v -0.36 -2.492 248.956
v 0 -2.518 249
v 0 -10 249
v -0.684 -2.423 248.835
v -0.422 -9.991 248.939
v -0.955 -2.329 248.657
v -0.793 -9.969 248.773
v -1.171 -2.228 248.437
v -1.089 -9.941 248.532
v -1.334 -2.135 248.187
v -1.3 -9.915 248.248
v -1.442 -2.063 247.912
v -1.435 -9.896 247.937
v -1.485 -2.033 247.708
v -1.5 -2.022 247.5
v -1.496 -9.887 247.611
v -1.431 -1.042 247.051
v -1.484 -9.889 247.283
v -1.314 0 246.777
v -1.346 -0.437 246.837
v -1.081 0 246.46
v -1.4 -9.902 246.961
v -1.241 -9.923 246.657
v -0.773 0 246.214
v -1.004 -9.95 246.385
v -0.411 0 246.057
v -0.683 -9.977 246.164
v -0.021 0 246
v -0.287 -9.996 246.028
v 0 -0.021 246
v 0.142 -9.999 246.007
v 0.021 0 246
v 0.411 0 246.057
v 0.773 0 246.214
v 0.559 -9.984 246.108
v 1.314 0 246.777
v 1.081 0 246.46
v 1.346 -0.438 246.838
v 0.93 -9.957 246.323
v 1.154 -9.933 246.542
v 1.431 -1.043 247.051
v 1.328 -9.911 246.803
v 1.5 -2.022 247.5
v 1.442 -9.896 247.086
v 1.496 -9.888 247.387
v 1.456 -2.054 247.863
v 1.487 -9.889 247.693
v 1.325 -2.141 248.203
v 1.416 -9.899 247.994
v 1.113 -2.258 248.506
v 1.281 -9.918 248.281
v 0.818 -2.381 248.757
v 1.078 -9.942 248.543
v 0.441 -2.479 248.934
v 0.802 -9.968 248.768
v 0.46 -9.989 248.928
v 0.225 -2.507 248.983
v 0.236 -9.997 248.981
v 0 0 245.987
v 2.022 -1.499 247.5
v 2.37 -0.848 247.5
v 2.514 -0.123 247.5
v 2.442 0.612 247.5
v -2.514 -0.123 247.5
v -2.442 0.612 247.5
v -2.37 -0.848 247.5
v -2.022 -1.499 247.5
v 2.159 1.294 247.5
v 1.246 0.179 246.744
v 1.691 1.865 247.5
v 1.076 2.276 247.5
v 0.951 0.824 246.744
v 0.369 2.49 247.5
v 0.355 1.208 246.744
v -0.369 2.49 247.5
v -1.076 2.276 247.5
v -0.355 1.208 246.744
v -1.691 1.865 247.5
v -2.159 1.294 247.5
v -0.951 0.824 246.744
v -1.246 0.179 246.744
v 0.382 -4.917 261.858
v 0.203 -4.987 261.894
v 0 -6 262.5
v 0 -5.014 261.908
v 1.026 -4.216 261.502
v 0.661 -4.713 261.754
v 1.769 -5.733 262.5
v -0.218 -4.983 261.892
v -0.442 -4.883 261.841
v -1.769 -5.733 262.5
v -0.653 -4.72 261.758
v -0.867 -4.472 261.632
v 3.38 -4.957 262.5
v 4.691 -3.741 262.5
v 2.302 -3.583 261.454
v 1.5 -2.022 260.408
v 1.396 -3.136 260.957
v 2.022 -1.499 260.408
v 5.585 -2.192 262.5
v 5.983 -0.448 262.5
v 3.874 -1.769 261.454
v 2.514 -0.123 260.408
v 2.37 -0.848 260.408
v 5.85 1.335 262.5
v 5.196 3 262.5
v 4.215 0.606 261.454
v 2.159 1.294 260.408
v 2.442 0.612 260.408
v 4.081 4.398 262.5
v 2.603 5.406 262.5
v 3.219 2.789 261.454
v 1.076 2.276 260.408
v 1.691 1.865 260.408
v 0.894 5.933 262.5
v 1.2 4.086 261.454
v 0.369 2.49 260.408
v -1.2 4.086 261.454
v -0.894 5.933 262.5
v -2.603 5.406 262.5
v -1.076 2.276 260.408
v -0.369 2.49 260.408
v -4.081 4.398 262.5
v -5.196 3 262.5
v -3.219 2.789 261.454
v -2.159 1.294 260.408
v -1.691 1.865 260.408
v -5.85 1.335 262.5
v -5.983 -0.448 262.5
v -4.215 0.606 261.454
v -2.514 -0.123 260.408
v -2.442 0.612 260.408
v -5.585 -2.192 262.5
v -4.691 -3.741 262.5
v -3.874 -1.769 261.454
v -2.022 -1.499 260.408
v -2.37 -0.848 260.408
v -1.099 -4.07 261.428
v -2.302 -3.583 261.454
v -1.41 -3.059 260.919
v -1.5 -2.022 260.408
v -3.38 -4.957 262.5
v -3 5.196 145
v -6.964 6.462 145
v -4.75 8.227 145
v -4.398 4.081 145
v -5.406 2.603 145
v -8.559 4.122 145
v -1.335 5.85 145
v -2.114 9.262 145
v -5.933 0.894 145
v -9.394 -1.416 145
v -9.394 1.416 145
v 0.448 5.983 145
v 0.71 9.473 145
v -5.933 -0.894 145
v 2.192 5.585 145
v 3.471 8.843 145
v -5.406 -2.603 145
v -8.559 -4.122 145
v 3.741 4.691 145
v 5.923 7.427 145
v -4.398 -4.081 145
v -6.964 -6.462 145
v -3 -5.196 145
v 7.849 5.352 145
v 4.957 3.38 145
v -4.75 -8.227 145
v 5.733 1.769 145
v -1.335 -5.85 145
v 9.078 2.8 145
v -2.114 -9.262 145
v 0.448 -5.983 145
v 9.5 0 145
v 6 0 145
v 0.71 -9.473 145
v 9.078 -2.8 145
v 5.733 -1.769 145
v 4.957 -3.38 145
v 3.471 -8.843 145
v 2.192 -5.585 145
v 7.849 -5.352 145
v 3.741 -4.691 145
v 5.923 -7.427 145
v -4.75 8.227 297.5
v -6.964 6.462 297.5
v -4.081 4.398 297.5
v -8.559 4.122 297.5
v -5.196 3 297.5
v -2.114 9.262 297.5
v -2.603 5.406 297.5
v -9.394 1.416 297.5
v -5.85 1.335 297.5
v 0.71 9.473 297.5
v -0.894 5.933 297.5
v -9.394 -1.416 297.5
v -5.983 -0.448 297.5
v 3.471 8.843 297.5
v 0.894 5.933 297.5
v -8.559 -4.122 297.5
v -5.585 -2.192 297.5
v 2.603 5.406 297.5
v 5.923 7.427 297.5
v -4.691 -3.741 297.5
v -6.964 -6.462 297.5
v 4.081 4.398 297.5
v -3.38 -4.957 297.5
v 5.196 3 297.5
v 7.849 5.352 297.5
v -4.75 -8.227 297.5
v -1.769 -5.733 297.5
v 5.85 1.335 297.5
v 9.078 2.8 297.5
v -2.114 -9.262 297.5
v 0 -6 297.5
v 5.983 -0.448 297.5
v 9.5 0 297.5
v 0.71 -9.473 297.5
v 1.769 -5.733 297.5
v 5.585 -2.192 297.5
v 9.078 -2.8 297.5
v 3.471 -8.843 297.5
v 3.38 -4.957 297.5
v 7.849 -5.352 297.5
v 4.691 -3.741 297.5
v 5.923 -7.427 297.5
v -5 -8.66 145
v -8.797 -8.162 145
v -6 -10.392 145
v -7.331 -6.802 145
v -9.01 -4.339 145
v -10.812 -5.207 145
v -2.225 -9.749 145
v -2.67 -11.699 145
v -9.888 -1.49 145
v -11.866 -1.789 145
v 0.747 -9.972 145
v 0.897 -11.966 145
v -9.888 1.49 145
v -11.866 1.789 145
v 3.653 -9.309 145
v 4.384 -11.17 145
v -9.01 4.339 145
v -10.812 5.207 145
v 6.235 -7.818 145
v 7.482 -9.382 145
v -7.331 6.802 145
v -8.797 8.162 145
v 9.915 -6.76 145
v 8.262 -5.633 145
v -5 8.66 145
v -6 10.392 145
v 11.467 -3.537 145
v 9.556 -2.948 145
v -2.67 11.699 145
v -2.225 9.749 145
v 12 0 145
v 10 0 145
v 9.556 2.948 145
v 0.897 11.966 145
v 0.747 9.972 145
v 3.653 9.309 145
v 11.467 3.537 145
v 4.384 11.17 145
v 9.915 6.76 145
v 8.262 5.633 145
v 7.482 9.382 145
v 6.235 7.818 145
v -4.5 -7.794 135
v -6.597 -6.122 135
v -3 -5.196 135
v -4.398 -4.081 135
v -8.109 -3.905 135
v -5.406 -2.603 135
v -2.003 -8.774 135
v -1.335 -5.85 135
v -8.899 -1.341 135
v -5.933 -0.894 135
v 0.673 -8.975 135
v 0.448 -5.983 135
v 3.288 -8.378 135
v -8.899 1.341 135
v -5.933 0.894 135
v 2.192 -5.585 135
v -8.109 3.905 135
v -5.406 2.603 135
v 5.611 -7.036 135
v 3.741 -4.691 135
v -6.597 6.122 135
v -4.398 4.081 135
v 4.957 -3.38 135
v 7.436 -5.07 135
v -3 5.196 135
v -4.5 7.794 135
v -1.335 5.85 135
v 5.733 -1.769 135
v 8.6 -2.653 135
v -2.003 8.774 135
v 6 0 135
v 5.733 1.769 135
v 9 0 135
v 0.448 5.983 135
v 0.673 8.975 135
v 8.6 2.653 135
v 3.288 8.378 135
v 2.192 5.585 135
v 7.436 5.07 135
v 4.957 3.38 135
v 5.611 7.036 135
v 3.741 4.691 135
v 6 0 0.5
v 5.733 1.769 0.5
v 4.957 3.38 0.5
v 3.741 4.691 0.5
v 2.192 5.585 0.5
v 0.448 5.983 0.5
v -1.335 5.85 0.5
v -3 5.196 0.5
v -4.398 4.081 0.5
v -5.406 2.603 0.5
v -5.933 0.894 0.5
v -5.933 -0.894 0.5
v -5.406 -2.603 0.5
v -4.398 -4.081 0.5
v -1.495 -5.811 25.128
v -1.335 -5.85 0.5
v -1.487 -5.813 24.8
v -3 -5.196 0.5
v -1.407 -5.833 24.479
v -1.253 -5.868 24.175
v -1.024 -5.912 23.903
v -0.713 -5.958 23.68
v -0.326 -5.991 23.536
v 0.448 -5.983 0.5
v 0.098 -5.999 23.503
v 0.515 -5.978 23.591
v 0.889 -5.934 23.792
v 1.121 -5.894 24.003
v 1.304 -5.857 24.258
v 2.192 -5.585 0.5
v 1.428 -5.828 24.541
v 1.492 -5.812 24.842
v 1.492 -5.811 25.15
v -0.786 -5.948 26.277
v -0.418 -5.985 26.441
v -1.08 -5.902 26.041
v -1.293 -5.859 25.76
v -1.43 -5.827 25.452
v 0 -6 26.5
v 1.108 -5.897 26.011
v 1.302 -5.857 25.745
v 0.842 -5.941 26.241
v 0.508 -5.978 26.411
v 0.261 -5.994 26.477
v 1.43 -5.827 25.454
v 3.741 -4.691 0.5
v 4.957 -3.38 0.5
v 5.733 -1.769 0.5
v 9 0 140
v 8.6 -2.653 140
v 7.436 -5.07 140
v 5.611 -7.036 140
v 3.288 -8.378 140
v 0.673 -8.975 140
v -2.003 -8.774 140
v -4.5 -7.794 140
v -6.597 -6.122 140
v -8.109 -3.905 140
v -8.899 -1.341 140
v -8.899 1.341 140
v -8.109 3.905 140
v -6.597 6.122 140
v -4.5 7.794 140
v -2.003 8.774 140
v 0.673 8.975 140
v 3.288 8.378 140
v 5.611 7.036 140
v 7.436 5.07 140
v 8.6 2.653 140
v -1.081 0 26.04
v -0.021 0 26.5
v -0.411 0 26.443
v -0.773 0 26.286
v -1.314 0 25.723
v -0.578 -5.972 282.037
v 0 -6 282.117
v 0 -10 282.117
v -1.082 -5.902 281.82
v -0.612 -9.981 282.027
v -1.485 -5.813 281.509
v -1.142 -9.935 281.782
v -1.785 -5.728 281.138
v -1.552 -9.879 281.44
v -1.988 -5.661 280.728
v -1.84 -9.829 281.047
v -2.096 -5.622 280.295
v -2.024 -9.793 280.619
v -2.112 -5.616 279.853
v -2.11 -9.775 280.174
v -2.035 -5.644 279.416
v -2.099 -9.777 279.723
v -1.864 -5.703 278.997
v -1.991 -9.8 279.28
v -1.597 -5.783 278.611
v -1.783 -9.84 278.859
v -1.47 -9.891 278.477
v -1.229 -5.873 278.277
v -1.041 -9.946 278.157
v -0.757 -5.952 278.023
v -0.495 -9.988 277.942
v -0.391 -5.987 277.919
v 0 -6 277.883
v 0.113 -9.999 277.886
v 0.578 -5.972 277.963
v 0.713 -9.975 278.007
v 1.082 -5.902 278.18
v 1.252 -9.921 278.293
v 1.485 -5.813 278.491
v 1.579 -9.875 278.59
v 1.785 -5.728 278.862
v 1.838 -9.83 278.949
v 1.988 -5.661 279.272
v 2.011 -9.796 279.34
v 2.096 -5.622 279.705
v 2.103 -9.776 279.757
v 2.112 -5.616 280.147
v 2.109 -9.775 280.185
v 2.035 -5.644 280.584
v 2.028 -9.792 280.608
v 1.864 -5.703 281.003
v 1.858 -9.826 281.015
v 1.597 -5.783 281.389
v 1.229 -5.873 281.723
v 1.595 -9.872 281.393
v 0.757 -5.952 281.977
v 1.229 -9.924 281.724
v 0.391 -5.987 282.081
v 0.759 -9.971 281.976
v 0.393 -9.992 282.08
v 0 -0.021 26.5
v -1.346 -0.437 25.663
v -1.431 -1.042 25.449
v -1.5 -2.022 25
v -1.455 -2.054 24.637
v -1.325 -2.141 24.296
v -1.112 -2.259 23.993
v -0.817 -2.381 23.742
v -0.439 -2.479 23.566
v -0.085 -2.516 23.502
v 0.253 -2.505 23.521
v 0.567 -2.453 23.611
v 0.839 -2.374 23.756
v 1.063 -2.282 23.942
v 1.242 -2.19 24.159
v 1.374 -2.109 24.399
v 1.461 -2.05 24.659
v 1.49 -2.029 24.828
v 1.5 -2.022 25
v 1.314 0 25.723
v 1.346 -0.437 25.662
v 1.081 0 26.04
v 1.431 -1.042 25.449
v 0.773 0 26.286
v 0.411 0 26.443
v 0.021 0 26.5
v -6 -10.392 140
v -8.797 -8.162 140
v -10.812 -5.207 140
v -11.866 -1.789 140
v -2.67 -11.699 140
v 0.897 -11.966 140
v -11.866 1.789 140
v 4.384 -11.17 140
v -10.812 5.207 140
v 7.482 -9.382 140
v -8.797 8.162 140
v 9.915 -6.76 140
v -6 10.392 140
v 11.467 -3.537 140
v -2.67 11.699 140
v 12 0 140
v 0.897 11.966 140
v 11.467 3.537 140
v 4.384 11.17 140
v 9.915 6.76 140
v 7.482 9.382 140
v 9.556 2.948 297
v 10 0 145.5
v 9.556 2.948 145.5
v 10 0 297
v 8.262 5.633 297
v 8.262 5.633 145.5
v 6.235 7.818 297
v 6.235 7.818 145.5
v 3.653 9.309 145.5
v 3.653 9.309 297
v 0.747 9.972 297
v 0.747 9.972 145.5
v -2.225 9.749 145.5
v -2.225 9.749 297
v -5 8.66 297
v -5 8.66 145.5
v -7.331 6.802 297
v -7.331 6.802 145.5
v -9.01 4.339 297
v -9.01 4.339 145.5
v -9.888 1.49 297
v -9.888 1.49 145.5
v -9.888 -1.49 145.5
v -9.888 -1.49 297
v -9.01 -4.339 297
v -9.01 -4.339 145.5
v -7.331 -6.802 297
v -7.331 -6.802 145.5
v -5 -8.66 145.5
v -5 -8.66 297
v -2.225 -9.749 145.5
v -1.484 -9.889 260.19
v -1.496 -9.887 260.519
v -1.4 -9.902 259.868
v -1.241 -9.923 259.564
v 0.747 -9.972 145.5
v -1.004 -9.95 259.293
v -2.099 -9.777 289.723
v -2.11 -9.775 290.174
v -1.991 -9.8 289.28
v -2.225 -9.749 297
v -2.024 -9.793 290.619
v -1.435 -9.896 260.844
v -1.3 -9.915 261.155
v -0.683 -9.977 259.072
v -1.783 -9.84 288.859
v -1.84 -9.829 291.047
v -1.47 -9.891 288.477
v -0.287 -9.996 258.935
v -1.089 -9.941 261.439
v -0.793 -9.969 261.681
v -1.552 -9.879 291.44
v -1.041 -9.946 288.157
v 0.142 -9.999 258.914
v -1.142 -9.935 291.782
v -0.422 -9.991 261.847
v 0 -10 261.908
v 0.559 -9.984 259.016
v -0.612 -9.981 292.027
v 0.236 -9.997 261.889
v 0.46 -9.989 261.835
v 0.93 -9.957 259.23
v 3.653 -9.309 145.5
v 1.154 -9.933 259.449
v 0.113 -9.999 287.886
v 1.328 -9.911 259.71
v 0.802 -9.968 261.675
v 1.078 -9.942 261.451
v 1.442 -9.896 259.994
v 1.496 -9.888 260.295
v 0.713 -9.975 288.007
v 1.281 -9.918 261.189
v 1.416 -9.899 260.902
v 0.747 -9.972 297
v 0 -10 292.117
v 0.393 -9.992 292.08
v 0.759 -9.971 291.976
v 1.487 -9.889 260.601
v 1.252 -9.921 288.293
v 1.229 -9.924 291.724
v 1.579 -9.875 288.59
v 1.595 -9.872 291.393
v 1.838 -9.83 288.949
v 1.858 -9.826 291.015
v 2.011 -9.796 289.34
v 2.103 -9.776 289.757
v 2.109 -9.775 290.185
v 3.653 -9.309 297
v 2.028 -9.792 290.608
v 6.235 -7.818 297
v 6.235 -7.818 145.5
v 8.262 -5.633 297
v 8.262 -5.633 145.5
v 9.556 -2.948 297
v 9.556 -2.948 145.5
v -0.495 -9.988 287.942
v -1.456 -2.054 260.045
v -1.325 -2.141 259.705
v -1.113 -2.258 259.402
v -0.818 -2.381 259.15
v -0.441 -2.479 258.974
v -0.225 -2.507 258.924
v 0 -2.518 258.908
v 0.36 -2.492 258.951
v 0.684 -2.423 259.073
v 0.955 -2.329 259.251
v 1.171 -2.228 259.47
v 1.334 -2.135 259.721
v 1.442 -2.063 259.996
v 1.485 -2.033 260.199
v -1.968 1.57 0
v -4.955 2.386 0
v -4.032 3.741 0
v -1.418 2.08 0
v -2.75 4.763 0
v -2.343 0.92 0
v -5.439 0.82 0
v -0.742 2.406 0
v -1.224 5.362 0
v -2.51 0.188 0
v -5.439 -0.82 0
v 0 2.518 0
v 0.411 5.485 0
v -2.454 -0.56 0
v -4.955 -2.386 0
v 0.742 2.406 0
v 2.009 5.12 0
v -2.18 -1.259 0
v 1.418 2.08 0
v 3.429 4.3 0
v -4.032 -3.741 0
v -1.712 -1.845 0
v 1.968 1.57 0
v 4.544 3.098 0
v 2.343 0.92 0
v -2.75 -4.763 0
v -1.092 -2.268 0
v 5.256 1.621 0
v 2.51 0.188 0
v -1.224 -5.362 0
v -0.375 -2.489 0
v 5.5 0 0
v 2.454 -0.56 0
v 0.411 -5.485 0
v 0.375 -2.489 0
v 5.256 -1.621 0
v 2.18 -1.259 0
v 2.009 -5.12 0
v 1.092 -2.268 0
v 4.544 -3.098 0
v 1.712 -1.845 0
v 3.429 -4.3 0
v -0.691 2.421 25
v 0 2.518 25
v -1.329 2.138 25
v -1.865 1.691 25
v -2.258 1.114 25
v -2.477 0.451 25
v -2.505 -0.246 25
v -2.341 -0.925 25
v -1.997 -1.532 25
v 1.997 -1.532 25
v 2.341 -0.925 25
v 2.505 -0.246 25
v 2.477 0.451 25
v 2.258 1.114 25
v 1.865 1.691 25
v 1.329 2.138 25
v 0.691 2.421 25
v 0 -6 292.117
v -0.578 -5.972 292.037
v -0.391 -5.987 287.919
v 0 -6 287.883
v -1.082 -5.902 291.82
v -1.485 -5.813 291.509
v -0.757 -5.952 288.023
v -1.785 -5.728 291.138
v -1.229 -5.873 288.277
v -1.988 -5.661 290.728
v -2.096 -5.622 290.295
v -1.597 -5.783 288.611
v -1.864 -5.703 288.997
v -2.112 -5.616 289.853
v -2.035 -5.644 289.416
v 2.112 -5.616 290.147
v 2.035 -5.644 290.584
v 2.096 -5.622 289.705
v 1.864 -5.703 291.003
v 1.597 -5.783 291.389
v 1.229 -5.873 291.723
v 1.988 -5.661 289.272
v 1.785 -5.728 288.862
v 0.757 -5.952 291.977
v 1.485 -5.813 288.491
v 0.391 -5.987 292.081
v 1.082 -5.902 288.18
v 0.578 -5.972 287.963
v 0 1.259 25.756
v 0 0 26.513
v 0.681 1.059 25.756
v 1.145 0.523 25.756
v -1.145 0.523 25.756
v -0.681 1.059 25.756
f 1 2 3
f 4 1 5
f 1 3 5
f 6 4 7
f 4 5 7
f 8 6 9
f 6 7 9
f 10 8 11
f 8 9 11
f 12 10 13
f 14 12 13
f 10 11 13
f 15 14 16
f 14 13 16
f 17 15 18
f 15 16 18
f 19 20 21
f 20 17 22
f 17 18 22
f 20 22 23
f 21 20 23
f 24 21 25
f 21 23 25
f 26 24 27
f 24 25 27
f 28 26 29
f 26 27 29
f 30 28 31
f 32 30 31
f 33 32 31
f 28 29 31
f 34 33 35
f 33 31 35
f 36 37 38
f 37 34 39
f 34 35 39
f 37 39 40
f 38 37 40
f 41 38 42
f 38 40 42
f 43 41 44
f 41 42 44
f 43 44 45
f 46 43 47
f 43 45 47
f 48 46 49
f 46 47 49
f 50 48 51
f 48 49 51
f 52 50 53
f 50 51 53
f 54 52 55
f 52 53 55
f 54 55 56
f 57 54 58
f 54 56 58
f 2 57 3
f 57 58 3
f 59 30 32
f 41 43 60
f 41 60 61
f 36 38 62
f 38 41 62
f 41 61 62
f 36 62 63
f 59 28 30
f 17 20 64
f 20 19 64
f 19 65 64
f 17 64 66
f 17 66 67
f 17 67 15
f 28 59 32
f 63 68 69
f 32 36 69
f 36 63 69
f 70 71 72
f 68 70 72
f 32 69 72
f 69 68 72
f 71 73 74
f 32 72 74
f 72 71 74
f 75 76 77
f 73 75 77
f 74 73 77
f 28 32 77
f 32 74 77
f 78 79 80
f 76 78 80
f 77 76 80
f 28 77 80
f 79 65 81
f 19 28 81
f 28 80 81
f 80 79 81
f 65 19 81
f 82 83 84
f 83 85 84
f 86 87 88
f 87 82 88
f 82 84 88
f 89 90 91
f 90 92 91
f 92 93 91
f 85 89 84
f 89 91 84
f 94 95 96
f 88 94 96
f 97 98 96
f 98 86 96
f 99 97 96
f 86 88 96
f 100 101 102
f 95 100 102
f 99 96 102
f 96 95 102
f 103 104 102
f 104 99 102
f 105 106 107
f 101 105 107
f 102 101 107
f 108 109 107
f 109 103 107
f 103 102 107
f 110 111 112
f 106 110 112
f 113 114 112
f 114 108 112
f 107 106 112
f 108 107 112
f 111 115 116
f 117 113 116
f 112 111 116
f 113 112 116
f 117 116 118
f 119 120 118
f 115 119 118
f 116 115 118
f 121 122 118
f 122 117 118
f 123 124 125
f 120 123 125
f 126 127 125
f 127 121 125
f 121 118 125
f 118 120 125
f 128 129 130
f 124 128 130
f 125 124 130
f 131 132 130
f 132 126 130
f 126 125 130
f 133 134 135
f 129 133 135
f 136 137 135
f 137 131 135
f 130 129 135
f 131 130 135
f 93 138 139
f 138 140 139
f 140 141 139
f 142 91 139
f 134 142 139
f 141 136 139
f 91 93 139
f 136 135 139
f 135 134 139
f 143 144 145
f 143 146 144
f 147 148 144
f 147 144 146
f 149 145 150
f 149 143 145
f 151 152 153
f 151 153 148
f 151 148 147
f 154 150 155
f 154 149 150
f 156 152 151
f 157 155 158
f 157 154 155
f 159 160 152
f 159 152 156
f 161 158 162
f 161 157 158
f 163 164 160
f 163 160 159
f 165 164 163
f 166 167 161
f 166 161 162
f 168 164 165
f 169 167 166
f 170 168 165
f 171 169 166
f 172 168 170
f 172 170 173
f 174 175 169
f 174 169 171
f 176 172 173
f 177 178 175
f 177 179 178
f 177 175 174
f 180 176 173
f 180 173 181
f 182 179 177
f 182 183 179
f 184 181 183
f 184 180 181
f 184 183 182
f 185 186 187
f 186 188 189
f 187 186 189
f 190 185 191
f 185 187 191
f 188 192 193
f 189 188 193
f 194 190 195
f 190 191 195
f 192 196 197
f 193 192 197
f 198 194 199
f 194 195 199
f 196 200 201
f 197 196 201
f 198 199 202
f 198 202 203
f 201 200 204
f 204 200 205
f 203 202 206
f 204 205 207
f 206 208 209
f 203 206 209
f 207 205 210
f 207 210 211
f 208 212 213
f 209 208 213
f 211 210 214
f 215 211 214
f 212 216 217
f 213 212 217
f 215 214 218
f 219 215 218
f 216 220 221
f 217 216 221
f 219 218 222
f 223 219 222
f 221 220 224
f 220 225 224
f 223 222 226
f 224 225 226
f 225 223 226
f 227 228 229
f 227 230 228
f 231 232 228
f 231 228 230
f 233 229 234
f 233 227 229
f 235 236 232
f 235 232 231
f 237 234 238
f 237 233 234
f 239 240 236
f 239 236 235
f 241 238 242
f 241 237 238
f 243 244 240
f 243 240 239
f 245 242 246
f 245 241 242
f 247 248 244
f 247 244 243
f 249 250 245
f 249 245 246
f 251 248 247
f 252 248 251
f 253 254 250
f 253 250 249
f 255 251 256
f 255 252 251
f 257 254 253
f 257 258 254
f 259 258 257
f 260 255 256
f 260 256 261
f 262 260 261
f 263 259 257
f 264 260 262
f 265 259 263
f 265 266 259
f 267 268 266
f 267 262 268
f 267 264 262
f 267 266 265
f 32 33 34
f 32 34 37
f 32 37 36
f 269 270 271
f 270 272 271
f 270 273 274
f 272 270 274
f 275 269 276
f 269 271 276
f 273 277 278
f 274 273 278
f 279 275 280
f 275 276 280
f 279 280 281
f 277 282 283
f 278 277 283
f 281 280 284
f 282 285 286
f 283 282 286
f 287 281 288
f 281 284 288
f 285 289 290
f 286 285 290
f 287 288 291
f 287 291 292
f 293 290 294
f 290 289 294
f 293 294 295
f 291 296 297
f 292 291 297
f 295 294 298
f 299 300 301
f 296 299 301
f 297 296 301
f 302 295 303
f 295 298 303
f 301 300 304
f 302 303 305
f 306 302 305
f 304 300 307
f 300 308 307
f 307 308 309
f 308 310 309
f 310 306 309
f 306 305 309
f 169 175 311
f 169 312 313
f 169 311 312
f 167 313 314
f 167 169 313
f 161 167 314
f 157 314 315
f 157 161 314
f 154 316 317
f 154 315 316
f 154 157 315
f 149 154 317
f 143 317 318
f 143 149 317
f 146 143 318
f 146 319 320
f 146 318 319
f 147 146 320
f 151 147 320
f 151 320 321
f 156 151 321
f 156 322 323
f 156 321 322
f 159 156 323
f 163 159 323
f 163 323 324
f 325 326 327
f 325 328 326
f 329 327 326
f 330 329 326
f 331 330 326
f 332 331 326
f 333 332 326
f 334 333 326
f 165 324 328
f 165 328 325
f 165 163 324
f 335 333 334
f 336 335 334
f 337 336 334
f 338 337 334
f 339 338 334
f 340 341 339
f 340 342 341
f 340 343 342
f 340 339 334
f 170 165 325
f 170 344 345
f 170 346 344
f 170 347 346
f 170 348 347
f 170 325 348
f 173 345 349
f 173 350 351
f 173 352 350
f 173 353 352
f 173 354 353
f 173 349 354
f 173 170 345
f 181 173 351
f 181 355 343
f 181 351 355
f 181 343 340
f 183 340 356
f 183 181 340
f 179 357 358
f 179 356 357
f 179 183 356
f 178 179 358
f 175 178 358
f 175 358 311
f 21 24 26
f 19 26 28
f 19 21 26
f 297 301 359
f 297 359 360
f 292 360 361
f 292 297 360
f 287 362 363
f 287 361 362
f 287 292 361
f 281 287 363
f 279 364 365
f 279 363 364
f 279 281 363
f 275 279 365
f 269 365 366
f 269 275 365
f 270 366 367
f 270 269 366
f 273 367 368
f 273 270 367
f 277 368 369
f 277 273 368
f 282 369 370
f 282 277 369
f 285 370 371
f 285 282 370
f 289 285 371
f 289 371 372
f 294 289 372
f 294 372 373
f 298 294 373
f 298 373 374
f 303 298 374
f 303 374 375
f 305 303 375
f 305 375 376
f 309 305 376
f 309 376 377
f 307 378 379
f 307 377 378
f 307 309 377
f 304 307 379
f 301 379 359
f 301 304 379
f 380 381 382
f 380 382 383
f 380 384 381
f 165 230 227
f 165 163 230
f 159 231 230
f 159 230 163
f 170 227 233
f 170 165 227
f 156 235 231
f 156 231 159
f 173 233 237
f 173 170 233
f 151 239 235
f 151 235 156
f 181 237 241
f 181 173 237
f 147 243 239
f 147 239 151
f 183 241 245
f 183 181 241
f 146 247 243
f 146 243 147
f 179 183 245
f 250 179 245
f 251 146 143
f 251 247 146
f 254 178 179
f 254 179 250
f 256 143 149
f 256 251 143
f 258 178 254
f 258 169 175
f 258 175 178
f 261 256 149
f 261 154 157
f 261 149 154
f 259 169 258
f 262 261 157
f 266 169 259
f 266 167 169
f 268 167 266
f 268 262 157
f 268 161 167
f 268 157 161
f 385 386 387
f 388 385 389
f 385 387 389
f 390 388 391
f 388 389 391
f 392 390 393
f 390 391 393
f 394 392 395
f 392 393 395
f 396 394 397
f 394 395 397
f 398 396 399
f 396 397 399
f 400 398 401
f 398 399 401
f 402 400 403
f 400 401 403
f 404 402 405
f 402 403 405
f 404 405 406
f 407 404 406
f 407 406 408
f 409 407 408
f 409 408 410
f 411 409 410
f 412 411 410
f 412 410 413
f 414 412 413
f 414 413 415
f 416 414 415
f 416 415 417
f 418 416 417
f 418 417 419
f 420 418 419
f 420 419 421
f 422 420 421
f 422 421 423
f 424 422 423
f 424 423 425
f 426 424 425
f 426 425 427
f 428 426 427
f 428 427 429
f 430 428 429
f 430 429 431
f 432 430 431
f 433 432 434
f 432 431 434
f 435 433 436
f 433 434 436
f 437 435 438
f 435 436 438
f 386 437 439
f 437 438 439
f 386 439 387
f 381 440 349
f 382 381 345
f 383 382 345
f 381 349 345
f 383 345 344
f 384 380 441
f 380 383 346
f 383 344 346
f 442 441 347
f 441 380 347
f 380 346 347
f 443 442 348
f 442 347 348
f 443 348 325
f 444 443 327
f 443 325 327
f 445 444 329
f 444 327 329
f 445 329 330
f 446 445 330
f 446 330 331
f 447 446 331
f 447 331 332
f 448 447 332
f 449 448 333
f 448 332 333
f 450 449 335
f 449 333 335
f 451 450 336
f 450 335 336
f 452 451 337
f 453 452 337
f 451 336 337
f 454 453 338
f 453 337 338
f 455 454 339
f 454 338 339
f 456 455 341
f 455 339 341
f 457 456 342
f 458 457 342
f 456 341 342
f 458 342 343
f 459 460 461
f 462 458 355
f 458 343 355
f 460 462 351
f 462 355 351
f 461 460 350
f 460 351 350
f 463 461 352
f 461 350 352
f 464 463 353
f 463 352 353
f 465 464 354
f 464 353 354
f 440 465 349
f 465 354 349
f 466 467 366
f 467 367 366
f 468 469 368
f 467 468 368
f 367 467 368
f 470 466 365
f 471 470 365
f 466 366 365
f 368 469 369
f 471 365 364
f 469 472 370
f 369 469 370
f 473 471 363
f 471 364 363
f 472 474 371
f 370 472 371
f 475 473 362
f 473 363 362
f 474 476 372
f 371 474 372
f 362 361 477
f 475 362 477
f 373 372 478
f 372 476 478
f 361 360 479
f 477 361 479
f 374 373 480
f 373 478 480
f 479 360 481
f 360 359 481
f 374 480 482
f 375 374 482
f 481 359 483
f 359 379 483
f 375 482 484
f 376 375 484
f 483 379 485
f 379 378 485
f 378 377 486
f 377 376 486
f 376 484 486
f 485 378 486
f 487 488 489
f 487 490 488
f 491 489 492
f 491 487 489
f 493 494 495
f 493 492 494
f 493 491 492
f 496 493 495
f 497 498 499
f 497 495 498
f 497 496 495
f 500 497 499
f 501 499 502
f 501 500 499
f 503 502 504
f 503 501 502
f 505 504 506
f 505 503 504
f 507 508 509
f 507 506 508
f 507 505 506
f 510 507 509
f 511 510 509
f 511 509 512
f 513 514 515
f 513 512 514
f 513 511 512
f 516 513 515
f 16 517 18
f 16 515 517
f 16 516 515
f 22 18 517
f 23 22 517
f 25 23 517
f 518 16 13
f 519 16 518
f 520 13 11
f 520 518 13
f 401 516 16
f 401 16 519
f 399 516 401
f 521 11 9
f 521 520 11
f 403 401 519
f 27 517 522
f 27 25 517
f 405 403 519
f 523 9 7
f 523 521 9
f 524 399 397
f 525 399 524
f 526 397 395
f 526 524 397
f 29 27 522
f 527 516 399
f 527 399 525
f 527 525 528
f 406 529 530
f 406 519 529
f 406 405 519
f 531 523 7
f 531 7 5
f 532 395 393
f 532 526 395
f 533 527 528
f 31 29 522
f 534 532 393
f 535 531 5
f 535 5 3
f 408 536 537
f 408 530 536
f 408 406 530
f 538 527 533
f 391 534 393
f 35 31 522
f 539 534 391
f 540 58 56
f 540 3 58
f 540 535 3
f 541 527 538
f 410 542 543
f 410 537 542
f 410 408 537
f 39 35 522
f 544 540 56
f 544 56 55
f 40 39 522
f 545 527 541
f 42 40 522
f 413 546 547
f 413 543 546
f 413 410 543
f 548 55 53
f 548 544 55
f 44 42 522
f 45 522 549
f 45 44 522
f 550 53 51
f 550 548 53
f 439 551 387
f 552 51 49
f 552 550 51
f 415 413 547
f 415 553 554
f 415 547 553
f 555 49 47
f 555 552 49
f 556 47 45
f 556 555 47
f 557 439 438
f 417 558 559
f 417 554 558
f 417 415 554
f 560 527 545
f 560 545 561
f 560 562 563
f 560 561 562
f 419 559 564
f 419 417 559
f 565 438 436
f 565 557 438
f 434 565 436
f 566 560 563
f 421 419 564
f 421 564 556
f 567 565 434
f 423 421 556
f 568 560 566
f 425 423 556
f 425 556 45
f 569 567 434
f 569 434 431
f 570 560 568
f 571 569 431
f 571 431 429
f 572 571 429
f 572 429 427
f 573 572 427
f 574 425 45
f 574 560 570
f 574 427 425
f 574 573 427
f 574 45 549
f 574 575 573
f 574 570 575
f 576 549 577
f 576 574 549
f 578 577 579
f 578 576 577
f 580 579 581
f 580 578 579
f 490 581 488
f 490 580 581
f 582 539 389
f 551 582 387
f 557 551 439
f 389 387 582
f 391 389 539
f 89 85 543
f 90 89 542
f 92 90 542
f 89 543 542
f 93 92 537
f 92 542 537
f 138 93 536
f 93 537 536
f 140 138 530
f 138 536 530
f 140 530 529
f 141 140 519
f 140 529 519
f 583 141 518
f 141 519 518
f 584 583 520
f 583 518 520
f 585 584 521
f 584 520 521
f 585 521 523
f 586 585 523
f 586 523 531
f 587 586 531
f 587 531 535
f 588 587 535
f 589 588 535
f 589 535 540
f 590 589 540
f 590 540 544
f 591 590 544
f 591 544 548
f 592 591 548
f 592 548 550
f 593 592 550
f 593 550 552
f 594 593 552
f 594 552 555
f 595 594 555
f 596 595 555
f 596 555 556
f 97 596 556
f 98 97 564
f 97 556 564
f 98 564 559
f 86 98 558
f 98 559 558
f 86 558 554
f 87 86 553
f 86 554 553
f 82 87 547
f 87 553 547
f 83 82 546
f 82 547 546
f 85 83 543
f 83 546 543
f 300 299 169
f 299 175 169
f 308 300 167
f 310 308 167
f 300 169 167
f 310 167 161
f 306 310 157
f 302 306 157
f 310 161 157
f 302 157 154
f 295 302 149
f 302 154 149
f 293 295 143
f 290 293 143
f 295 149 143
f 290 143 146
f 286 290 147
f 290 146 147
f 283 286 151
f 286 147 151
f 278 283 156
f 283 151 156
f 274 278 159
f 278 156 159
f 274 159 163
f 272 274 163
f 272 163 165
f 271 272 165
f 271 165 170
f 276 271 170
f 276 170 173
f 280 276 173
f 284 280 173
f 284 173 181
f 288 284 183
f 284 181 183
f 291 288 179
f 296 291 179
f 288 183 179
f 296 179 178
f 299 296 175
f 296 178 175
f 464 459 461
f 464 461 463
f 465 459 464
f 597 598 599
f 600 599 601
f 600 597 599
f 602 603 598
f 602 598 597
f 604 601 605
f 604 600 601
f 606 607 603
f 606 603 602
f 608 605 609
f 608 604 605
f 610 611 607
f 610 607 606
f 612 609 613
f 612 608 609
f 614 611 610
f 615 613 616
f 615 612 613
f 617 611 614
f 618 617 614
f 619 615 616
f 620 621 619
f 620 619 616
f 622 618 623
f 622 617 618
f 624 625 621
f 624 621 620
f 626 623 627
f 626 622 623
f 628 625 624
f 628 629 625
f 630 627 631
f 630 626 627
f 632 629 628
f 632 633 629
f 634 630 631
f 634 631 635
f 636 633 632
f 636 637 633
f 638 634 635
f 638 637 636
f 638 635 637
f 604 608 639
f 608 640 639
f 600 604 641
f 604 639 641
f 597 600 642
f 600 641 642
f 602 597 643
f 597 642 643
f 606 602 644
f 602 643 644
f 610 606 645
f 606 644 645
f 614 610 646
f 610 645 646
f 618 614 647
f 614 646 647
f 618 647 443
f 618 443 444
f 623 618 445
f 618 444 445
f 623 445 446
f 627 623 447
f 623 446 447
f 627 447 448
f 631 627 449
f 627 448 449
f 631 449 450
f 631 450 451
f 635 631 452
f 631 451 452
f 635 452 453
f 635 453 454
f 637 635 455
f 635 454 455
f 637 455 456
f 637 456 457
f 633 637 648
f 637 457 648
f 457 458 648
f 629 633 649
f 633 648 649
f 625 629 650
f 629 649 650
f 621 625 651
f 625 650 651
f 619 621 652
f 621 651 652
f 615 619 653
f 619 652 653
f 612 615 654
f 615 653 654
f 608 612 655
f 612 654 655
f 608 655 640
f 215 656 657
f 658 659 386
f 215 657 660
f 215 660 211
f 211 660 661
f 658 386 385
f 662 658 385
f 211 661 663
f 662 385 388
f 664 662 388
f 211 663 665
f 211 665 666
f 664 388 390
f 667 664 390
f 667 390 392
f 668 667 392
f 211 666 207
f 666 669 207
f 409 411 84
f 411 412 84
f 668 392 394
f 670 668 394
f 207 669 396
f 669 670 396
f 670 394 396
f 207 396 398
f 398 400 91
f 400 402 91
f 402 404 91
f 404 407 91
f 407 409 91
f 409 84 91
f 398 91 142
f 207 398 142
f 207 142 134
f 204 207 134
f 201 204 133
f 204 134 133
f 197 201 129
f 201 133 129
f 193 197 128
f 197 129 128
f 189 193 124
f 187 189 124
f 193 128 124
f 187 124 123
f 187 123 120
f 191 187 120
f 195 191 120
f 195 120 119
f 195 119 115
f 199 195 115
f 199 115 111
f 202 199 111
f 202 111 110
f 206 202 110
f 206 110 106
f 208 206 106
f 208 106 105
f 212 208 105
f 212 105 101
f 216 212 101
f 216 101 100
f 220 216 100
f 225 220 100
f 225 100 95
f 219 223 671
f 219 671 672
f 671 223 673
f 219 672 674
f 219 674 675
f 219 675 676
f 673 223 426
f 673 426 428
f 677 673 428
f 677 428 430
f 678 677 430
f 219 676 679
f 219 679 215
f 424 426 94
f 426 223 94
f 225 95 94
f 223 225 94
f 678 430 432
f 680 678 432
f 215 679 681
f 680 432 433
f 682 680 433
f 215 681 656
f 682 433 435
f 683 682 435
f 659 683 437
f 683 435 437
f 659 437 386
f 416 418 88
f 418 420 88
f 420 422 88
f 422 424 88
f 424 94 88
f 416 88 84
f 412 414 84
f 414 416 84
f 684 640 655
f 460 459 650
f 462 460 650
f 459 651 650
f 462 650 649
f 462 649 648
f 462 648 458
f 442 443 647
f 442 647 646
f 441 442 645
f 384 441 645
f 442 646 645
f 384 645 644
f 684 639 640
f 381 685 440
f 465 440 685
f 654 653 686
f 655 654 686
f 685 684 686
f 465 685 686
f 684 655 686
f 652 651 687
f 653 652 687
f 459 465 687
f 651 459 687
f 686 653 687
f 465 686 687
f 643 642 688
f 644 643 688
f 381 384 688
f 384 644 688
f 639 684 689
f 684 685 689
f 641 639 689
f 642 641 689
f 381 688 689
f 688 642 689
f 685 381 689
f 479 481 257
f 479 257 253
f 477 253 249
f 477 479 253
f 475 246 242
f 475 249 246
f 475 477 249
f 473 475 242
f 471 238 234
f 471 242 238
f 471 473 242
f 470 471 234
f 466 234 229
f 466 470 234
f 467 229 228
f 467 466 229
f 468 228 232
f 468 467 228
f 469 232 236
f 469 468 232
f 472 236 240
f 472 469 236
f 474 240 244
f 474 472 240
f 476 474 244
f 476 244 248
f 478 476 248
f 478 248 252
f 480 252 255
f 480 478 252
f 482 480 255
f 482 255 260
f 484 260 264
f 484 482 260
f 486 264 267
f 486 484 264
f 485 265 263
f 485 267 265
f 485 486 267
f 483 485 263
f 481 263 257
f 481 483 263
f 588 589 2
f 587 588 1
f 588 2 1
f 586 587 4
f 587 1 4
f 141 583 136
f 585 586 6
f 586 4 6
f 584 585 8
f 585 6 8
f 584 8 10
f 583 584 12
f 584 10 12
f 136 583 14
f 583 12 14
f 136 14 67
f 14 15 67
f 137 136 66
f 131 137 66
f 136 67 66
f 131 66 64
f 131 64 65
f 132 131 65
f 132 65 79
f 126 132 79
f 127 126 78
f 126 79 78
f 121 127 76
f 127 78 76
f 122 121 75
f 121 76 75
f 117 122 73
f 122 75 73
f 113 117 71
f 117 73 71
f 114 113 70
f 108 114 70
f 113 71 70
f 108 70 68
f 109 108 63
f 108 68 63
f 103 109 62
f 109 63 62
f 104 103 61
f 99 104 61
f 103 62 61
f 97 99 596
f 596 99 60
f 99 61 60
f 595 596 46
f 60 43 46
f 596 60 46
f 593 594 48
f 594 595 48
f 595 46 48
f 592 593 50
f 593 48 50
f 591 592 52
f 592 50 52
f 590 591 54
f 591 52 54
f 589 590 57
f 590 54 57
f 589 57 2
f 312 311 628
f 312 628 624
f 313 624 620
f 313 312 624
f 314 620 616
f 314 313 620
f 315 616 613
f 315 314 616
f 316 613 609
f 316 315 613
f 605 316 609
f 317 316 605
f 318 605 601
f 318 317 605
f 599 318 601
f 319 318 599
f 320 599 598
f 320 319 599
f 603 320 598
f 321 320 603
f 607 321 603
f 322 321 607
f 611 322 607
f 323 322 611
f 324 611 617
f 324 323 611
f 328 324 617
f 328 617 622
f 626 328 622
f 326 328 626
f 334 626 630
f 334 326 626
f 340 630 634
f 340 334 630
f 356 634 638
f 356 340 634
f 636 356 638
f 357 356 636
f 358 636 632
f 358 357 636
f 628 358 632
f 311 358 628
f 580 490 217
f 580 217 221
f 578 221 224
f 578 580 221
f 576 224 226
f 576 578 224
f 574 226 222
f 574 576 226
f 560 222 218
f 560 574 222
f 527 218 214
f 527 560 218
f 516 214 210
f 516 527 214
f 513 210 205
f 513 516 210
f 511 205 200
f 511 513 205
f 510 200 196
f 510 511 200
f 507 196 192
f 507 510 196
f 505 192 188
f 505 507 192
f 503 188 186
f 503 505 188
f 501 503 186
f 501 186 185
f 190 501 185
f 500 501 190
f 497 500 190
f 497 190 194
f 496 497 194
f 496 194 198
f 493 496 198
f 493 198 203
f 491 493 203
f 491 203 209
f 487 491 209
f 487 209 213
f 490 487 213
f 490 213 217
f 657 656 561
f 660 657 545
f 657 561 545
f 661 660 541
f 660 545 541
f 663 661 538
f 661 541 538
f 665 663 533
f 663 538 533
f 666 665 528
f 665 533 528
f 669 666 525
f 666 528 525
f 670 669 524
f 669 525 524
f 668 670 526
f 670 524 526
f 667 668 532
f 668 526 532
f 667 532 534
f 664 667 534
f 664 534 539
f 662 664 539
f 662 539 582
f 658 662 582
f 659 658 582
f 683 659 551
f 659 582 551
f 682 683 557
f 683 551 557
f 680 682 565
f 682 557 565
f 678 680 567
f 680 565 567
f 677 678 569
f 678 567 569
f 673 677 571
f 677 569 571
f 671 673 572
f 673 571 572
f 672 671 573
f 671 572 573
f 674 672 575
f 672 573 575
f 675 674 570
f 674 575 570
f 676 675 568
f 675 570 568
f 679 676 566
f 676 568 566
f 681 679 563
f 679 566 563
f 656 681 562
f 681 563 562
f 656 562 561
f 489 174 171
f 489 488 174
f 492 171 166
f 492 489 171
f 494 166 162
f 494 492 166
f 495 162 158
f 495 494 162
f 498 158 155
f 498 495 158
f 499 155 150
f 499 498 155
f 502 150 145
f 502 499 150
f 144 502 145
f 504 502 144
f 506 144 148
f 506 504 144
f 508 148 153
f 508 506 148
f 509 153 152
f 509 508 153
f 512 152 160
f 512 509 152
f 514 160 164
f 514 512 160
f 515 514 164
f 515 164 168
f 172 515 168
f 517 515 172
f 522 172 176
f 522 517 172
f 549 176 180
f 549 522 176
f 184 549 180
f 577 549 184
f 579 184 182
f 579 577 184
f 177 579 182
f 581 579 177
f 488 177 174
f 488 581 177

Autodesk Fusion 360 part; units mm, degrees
sketch "Sketch1" plane through (0, 0, 0) normal (0, 1, 0) x (1, 0, 0)
  line L0 (0, 0) -> (6, 0)
  line L1 (6, 0) -> (6, -145)
  line L2 (6, -145) -> (10, -145)
  line L3 (10, -145) -> (10, -297.5)
  line L4 (10, -297.5) -> (0, -297.5)
  line L5 (0, -297.5) -> (0, 0)
  line L6 (10, -145) -> (12, -145)
  line L7 (12, -145) -> (12, -140)
  line L8 (12, -140) -> (9, -140)
  line L9 (9, -140) -> (9, -135)
  line L10 (9, -135) -> (6, -135)
  dimension "d1" = 10
  dimension "d2" = 6
  dimension "d3" = 145
  dimension "d4" = 152.5
  dimension "d12" = 5
  dimension "d13" = 9
  dimension "d14" = 12
  dimension "d15" = 5
revolve "Revolve1" add sketch "Sketch1" angle 360 about axis through (0, 0, 297.5) along (0, 0, -1) contours L0 L1 L2 L3 L4 L5 makes body 1
hole "Hole1" at (0, 0, 297.5) direction (0, 0, -1) diameter 12 depth 35 tip angle 118 bodies 1
hole "Hole2" at (0, 0, 297.5) direction (0, 0, -1) diameter 5.035 depth 50 tip angle 118 bodies 1
hole "Hole3" at (0, 0, 0) direction (0, 0, 1) diameter 5.035 depth 25 tip angle 118 bodies 1
chamfer "Chamfer1" distance 0.5 angle 45 3 edges at (-5.594, -2.1697, 0) (-9.3233, -3.6162, 145) (-9.3233, -3.6162, 297.5) on bodies 1
revolve "Revolve2" add sketch "Sketch1" angle 360 about axis through (0, 0, 1.75) along (0, 0, 1) separate body contours L1 L2 L6 L7 L8 L9 L10 makes body 2
sketch "Sketch2" plane through (0, 0, 0) normal (0, 1, 0) x (1, 0, 0)
  line L0 (2.5175, -247.5) -> (-2.5175, -247.5)
  line L1 (2.5175, -260.4075) -> (-2.5175, -260.4075)
  line L2 (9.5, -297.5) -> (-9.5, -297.5)
  point P0 (0, -247.5)
  point P1 (0, -260.4075)
  point P2 (0, -25)
  point P3 (0, -280)
  point P4 (0, -290)
  dimension "d24" = 10
  dimension "d25" = 7.5
hole "Hole4" at (0, 0, 25) at (0, 0, 247.5) at (0, 0, 260.4075) direction (0, -1, 0) diameter 3 end through all bodies 1 1
copy_body "Body->Comp1" bodies 1 removing the originals makes body 3 in component "vertical rod"
copy_body "Body->Comp2" bodies 2 removing the originals makes body 4 in component "peek insulator"
hole "Hole1'" at (0, 0, 280) at (0, 0, 290) direction (0, -1, 0) diameter 4.234 end through all bodies 3 3 in component "vertical rod"
component "vertical rod" placed x (1, 0, 0) y (0, 1, 0) z (0, 0, 1) at (0, 0, 0)
component "peek insulator" placed x (1, 0, 0) y (0, 1, 0) z (0, 0, 1) at (0, 0, 0)
equation "d4 = 117.5 mm + 35 mm"
